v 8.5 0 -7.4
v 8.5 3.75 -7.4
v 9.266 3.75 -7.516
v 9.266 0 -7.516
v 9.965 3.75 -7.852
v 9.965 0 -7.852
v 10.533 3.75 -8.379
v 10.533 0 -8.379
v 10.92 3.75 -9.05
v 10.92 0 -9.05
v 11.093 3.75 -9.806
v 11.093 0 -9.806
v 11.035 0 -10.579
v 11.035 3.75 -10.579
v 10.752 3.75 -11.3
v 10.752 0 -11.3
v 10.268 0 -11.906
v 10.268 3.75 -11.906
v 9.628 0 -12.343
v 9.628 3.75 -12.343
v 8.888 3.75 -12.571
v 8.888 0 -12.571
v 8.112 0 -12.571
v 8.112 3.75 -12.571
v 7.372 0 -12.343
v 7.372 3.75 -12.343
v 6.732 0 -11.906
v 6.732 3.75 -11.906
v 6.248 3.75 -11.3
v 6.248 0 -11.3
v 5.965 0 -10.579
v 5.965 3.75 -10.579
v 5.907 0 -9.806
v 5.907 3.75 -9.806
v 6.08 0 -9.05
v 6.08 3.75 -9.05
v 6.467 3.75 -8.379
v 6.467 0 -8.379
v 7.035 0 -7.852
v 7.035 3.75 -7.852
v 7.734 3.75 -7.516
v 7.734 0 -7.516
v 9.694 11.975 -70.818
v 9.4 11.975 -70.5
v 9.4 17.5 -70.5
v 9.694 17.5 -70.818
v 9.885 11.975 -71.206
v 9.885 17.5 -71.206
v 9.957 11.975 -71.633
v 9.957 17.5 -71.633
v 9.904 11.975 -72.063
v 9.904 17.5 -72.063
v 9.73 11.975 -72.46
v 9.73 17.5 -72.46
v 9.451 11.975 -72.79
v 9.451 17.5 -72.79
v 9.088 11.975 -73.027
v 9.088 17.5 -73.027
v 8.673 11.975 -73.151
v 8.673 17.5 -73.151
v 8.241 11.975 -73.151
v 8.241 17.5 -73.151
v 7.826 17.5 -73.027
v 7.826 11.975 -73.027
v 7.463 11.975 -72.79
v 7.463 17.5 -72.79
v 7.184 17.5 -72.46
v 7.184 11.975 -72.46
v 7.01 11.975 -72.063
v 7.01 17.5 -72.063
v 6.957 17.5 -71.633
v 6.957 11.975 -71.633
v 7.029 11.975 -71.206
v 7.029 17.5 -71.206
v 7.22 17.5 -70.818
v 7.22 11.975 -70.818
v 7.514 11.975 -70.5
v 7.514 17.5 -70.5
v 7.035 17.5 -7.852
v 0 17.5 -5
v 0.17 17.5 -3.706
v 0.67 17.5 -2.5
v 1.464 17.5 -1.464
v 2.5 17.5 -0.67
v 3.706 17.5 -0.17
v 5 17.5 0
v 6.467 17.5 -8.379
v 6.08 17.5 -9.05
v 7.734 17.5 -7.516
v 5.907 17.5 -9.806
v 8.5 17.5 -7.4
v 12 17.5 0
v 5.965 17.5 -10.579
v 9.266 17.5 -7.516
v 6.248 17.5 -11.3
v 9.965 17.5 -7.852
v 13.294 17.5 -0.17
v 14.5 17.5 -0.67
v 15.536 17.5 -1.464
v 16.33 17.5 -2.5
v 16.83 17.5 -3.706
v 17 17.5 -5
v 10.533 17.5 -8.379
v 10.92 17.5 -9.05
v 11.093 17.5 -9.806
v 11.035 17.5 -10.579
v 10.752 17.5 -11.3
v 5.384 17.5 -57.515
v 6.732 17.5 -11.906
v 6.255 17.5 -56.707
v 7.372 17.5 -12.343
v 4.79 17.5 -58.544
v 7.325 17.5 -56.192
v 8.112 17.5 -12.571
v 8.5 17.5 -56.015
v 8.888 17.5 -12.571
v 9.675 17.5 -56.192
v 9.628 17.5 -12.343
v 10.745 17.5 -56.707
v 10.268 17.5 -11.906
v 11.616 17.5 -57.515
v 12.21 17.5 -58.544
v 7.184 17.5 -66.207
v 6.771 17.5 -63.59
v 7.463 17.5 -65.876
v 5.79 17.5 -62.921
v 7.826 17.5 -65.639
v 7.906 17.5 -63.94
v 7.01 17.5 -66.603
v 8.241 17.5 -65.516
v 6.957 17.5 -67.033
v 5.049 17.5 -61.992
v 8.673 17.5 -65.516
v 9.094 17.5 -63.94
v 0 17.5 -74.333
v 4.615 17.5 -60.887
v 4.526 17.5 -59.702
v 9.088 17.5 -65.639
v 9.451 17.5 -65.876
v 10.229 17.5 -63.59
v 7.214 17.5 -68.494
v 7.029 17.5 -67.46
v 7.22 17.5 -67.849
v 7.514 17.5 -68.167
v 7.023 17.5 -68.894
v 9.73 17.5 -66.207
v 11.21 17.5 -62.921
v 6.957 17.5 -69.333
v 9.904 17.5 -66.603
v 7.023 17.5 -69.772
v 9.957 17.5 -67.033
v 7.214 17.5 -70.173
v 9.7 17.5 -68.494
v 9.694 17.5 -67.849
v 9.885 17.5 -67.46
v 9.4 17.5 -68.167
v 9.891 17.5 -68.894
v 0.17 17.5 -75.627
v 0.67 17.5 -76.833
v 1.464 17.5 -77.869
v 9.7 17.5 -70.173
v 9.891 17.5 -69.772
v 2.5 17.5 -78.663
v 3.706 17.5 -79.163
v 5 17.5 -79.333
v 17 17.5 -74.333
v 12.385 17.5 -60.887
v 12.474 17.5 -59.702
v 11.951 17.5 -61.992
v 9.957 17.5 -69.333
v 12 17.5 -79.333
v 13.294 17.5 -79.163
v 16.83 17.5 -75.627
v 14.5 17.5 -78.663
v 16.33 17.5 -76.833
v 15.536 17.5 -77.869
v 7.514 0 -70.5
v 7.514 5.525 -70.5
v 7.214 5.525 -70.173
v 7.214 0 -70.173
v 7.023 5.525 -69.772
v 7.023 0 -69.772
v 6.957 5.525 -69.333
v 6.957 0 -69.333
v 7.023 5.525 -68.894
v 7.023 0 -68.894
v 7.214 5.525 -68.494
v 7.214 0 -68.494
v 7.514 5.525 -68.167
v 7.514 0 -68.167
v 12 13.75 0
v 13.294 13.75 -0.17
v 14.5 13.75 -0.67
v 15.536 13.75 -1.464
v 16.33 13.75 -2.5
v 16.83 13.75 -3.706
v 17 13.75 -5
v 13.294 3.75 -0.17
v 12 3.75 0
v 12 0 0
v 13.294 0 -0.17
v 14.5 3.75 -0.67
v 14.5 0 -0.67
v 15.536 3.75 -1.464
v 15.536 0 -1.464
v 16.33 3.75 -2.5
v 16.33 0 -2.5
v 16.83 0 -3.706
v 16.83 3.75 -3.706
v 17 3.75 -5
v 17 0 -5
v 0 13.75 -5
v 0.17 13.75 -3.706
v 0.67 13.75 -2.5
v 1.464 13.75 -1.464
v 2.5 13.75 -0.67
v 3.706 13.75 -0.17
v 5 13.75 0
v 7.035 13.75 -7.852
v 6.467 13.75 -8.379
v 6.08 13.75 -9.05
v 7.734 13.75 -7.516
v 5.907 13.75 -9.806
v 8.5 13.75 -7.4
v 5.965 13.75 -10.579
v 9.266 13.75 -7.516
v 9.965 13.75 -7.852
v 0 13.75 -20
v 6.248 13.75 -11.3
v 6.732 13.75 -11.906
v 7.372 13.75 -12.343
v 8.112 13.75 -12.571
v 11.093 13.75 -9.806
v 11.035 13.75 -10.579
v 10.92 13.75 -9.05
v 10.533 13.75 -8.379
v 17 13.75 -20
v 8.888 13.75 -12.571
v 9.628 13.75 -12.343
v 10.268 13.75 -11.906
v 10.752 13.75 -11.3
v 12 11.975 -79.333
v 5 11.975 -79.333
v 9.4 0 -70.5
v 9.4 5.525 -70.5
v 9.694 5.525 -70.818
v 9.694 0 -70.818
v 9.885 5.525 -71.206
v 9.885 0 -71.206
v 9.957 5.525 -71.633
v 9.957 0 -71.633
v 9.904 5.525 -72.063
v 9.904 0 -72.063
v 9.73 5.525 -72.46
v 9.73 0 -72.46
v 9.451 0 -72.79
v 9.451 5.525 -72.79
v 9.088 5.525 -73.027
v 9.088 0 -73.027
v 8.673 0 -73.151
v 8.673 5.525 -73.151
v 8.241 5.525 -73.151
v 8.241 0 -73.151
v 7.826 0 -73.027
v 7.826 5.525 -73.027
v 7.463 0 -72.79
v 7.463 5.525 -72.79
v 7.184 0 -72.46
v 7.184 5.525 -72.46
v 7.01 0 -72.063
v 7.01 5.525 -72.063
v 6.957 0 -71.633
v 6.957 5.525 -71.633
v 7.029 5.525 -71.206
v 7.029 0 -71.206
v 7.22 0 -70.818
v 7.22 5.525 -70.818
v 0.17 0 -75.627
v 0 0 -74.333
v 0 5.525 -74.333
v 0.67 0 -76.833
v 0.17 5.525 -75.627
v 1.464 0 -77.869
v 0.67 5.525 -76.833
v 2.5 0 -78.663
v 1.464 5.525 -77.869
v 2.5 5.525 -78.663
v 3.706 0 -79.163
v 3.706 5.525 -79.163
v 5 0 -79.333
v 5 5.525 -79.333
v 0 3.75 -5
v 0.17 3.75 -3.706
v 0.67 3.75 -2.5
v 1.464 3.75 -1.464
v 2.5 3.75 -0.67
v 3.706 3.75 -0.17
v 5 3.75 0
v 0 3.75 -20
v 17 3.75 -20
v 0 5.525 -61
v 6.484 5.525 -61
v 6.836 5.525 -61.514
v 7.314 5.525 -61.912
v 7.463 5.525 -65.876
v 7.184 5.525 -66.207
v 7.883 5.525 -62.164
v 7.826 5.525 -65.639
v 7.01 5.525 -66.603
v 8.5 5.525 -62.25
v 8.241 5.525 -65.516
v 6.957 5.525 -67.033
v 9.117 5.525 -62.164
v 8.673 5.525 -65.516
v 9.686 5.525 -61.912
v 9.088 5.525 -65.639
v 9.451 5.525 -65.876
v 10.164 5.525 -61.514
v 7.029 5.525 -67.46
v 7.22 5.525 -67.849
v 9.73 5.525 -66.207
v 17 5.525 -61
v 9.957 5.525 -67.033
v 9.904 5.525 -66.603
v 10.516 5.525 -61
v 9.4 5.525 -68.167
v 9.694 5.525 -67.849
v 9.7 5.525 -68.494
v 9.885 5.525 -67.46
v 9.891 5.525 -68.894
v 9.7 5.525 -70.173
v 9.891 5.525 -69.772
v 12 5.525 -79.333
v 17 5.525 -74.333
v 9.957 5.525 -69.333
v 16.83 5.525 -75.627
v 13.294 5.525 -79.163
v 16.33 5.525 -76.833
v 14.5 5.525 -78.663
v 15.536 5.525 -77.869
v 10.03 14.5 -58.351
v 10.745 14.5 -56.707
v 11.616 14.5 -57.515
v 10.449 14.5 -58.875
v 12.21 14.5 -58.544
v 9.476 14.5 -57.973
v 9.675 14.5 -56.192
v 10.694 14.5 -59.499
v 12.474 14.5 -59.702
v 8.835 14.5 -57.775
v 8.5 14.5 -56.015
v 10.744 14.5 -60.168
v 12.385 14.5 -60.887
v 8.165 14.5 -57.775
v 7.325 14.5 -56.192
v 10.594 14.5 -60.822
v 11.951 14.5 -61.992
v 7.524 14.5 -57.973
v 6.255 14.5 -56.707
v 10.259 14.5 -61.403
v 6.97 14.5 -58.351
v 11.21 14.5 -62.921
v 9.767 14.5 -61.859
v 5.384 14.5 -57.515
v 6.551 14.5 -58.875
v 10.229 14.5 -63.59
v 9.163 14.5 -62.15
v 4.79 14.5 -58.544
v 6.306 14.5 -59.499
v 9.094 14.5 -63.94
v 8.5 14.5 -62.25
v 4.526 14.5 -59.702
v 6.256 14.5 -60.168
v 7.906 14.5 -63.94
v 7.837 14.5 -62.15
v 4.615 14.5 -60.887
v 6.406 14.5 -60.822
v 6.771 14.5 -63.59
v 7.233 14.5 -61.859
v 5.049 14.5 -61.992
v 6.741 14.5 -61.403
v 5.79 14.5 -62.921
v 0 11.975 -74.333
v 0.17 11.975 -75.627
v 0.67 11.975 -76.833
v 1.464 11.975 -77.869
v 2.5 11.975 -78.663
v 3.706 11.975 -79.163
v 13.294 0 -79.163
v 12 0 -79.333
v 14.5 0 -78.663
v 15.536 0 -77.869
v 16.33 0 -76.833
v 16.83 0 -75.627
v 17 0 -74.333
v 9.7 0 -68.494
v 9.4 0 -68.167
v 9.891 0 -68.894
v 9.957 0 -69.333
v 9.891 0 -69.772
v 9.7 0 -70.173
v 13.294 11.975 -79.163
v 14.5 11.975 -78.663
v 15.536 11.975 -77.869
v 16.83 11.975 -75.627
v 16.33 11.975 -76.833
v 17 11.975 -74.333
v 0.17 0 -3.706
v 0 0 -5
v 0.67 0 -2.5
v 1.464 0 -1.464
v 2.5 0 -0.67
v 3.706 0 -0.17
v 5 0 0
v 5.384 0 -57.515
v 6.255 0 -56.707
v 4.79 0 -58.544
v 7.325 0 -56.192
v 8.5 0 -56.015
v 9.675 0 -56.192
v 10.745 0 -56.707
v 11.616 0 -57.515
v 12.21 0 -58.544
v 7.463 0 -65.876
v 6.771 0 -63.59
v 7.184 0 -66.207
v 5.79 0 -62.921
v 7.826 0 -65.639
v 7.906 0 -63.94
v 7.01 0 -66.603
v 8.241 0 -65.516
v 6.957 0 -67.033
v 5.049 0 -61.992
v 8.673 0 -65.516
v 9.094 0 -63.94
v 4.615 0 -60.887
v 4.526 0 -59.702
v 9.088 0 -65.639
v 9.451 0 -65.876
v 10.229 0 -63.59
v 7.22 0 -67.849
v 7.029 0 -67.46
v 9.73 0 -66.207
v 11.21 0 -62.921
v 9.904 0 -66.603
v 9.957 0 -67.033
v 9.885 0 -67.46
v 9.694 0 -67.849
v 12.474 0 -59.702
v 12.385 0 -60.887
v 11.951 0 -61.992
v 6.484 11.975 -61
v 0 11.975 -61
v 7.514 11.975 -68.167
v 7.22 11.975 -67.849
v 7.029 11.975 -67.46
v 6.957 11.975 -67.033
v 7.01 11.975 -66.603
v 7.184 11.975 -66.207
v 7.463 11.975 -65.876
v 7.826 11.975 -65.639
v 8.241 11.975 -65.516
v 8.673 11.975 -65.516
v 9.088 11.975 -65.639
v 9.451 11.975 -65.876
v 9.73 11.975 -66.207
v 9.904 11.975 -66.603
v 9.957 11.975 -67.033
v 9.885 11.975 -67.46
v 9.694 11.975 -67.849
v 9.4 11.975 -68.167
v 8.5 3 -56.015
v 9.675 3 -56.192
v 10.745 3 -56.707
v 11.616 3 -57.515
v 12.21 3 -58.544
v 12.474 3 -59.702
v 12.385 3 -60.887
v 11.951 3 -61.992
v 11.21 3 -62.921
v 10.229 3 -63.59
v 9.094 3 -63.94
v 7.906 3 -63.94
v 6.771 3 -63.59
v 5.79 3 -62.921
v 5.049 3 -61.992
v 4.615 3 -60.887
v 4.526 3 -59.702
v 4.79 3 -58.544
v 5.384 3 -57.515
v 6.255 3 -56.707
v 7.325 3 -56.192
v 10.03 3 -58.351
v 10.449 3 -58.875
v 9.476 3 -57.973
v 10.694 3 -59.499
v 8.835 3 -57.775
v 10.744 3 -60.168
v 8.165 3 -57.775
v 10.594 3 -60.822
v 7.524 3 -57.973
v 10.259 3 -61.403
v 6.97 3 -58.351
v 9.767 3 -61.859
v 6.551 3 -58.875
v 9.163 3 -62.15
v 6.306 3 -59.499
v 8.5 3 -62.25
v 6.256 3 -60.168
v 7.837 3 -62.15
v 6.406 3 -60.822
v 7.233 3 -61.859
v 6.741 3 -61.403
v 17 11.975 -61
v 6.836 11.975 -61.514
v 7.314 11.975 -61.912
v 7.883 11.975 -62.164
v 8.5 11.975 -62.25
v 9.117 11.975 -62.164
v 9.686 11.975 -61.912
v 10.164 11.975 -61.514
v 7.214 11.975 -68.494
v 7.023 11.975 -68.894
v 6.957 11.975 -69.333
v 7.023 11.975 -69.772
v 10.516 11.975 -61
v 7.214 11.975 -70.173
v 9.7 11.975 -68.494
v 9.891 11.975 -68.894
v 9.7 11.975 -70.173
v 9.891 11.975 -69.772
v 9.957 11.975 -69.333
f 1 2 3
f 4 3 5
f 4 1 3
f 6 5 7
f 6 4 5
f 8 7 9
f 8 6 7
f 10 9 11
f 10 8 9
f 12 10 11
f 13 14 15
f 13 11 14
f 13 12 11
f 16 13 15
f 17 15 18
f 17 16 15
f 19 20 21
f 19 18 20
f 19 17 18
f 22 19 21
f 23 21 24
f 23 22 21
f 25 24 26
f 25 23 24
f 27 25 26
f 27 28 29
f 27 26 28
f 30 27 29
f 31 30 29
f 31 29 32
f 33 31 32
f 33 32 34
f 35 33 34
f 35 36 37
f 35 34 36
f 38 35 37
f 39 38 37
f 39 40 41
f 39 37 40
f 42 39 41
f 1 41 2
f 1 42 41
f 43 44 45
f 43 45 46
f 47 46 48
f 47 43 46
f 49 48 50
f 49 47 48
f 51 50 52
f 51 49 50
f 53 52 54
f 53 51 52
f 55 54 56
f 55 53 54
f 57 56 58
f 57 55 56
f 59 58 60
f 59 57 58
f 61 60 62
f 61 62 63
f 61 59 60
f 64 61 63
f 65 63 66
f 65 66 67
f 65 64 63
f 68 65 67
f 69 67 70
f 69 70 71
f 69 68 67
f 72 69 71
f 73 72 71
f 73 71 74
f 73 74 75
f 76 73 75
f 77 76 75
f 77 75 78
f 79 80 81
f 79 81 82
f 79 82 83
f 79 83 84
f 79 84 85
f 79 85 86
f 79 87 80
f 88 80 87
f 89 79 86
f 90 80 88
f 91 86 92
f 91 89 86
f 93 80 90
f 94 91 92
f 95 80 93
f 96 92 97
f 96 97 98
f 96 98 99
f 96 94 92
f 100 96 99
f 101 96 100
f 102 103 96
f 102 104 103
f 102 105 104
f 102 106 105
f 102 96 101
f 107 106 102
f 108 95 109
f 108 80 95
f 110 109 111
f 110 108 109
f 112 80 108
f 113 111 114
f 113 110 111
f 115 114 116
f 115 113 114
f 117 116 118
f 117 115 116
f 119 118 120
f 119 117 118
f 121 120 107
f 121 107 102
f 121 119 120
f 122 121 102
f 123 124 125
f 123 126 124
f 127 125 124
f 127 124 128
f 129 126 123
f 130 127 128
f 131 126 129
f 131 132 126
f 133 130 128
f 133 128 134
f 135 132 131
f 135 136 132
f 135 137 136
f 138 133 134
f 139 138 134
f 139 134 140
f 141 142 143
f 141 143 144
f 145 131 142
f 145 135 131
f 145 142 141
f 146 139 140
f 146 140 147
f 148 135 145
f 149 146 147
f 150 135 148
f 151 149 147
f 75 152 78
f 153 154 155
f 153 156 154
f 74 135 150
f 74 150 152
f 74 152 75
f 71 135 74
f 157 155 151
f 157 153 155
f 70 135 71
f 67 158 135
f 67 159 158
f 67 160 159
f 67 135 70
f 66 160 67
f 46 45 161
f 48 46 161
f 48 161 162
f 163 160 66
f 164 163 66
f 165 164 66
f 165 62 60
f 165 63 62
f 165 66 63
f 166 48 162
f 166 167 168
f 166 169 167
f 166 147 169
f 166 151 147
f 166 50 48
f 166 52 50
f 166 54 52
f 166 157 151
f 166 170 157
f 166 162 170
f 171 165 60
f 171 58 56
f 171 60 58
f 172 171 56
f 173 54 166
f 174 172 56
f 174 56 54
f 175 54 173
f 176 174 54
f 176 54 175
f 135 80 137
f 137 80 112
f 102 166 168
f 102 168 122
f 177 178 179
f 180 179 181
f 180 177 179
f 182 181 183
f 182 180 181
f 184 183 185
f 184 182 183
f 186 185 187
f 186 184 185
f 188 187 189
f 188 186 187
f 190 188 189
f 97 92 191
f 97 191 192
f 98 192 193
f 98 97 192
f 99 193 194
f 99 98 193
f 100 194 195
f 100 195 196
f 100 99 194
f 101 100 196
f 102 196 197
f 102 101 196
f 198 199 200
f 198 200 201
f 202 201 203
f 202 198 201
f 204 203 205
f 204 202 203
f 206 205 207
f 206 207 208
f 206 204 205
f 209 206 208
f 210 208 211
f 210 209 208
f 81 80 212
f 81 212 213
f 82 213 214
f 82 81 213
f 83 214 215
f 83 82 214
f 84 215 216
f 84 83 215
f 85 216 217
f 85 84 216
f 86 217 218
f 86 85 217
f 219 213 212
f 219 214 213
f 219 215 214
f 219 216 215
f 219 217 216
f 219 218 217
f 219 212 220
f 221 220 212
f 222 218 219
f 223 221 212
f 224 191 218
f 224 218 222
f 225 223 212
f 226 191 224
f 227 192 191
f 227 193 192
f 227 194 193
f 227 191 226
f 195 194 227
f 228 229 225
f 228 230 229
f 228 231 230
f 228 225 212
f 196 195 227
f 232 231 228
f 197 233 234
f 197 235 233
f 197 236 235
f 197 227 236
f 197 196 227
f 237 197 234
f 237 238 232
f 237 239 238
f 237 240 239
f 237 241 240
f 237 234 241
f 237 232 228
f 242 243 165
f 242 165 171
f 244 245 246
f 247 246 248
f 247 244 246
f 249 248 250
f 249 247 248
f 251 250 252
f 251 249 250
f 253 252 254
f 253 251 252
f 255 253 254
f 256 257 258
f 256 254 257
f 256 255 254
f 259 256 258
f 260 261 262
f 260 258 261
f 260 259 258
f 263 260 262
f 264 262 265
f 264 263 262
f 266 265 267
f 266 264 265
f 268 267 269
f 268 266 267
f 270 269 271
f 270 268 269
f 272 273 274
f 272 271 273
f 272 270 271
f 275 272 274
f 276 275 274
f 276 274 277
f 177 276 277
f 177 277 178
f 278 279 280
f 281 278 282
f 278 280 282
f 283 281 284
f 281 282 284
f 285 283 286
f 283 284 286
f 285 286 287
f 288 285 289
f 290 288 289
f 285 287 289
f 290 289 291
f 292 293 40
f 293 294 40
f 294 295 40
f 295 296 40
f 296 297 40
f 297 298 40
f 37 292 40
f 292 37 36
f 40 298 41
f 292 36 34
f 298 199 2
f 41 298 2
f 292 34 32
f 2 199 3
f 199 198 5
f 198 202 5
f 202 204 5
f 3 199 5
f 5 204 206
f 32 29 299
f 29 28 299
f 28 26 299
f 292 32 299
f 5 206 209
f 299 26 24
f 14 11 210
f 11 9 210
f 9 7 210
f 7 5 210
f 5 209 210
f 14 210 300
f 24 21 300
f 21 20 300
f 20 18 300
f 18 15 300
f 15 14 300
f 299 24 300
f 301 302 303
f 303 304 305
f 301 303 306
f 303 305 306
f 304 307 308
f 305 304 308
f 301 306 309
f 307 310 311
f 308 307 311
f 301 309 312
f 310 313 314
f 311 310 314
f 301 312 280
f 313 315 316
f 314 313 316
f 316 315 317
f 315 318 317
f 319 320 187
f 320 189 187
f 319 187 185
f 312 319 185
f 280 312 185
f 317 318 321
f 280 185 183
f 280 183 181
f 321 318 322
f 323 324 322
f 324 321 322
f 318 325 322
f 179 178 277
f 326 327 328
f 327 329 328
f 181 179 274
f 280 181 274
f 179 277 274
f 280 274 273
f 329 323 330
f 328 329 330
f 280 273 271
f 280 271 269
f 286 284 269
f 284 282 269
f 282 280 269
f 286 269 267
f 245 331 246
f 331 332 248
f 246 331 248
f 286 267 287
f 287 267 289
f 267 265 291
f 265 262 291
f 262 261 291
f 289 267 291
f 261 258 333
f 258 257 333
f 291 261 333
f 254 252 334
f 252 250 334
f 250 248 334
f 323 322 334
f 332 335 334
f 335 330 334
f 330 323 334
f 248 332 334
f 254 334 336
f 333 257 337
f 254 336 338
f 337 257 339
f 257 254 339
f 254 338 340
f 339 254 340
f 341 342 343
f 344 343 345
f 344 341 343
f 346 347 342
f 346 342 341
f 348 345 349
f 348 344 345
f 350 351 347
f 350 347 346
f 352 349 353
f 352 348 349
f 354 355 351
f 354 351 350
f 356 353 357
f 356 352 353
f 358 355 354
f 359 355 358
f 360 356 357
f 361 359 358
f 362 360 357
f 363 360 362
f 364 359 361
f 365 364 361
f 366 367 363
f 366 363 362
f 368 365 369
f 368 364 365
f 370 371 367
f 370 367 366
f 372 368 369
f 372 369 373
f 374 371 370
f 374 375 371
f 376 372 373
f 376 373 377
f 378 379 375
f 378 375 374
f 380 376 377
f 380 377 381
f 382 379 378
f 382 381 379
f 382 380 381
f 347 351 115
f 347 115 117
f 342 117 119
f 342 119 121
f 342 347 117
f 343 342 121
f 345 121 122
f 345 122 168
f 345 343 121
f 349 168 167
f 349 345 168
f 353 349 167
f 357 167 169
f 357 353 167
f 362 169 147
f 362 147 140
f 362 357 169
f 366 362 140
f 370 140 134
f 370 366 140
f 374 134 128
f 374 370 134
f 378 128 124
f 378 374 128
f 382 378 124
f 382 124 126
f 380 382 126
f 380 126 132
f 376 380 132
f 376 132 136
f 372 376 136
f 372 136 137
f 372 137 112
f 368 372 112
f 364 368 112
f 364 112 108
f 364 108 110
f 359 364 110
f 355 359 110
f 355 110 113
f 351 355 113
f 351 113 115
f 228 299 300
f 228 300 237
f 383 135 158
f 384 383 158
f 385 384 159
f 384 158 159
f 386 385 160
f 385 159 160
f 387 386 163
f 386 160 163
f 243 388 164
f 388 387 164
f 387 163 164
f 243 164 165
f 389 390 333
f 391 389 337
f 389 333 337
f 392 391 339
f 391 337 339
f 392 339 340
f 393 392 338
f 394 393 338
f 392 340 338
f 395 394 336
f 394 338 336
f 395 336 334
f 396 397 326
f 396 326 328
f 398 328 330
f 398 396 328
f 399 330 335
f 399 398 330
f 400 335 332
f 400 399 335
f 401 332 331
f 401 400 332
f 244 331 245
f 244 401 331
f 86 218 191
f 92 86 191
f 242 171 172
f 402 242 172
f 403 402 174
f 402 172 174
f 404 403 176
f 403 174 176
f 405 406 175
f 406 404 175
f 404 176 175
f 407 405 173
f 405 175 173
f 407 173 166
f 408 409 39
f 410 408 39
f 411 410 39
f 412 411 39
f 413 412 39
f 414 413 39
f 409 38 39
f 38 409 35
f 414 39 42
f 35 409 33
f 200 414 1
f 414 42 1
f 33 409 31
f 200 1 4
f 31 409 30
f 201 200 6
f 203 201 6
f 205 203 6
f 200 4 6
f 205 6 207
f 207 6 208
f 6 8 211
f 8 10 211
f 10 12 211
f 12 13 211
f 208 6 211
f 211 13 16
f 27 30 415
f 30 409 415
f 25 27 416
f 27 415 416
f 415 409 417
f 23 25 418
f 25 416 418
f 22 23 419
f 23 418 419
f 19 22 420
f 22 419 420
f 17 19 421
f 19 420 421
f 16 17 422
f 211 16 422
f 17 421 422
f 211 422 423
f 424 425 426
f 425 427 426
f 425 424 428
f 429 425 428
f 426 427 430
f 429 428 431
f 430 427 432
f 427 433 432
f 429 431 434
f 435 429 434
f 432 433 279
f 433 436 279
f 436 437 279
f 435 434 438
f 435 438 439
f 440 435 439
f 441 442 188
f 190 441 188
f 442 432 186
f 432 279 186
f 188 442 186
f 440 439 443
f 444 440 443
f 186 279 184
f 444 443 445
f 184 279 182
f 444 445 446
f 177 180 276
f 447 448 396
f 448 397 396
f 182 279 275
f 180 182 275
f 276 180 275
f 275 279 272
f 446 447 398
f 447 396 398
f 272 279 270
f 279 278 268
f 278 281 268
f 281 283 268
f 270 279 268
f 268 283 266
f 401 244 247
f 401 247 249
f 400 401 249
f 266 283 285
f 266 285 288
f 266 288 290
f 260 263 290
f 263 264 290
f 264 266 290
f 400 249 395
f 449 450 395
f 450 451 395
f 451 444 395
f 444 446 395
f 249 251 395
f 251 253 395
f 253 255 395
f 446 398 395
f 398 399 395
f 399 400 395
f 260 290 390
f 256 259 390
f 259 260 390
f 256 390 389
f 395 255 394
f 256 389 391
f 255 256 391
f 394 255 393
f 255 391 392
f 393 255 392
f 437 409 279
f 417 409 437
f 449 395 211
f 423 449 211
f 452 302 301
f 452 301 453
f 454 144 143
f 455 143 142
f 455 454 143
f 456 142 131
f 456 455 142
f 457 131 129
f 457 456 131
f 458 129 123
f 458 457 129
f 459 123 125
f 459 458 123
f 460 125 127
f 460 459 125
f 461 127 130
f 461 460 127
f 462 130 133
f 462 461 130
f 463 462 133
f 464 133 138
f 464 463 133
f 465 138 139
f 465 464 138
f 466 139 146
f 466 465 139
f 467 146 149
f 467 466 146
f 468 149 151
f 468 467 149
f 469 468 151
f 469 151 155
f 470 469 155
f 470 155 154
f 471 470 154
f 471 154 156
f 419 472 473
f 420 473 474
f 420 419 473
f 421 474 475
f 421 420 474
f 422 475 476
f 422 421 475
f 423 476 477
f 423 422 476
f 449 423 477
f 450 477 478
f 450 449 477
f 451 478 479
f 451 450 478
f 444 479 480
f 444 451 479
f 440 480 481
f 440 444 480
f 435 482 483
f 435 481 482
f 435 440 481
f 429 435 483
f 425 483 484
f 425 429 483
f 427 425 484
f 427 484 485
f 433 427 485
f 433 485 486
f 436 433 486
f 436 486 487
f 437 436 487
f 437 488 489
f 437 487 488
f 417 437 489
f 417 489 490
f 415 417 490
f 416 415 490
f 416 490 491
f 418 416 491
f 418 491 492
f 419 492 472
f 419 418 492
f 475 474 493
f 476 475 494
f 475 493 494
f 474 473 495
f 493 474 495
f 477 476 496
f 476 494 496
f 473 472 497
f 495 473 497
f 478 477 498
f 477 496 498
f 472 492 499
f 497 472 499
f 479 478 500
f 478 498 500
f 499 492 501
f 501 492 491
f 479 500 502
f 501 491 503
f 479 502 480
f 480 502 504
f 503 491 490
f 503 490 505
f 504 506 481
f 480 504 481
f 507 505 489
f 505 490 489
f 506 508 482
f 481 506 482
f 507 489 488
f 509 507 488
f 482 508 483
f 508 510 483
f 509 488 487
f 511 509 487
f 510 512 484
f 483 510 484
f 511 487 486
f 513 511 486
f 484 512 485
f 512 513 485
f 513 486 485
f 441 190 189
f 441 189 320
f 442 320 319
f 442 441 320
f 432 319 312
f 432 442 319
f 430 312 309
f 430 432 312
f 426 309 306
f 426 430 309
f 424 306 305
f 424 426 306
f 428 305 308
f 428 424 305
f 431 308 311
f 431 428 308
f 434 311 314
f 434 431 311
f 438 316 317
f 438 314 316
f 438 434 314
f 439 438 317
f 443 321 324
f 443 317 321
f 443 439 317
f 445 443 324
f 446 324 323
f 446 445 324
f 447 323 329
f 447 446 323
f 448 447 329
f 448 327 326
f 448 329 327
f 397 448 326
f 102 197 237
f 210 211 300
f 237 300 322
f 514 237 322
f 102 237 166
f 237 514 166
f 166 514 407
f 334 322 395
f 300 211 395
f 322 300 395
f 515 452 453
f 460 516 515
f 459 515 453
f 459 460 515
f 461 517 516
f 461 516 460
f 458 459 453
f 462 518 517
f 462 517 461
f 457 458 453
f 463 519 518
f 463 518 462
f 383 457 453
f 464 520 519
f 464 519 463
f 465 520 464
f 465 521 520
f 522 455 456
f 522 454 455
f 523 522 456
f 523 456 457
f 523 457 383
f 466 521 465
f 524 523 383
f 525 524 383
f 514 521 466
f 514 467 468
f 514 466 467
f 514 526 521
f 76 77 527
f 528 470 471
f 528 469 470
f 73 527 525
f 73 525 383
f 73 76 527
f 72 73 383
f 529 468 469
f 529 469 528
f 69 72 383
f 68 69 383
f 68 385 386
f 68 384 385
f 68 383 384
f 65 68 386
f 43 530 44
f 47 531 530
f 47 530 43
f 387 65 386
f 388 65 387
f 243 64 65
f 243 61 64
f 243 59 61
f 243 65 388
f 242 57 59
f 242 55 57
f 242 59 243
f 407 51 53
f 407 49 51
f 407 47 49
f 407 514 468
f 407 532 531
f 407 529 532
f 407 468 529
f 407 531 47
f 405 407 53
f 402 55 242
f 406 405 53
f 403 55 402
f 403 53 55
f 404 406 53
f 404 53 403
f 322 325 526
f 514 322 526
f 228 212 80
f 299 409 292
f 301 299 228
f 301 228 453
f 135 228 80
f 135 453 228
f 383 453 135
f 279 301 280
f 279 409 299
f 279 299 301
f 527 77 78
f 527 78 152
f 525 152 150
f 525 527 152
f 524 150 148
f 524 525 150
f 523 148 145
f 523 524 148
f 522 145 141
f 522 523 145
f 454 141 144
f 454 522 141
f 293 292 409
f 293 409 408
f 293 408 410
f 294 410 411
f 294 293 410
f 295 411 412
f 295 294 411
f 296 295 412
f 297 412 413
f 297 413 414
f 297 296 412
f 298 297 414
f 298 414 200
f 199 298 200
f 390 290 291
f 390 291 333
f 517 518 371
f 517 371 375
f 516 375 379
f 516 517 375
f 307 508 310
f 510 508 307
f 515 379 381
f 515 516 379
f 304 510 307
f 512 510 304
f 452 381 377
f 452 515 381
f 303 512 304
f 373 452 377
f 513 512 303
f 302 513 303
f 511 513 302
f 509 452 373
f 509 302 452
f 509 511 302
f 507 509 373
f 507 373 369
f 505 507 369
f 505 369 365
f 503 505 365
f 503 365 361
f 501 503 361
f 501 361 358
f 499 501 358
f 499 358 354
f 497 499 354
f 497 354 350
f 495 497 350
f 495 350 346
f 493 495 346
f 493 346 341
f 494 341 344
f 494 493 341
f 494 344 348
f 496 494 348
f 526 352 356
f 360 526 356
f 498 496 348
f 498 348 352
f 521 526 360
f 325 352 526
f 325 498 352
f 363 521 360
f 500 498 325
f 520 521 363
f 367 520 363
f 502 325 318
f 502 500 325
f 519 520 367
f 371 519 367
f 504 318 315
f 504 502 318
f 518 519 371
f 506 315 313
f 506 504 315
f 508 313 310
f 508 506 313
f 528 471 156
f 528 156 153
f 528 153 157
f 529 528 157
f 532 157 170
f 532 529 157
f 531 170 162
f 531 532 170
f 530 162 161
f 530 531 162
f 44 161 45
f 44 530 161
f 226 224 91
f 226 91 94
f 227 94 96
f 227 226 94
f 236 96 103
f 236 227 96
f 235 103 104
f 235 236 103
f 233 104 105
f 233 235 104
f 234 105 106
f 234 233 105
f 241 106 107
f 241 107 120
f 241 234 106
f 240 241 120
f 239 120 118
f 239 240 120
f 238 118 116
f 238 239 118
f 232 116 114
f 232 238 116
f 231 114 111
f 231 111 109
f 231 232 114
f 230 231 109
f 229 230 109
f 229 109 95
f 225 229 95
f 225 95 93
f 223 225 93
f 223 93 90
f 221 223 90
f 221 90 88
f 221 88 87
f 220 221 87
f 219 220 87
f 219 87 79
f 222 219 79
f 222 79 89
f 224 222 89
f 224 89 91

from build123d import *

# Parameters (mm, degrees)
SKETCH1_W                = 17
SKETCH1_H                = 79.3333
SKETCH1_R                = 2.6
SKETCH1_R_2              = 3.985
BOSS_EXTRUDE1_DEPTH      = 17.5
FILLET1_R                = 5
BOSS_EXTRUDE2_DEPTH      = 5.75
BOSS_EXTRUDE2_DEPTH_BACK = 5.75
SKETCH3_R                = 3.985
SKETCH3_R_2              = 2.25
SKETCH2_W                = 40
SKETCH2_H                = 10
SKETCH2_W_2              = 36.666864
SKETCH2_H_2              = 6.45
CUT_EXTRUDE2_DEPTH       = 84.000135475


with BuildPart() as part:
    # Sketch1 → Boss-Extrude1 (new body)
    with BuildSketch(Plane(origin=(0, 0, 0), x_dir=(1, 0, 0), z_dir=(0, 1, 0))):
        with Locations((8.5, 39.66665)):
            Rectangle(SKETCH1_W, SKETCH1_H)
        with Locations(Location((8.5, 10, 0), (0, 0, 270))):
            Circle(SKETCH1_R, mode=Mode.SUBTRACT)
        with Locations(Location((8.5, 60, 0), (0, 0, 270))):
            Circle(SKETCH1_R_2, mode=Mode.SUBTRACT)
        with BuildLine():
            ThreePointArc((7.51420262, 70.4998675), (6.957011868, 69.333201), (7.51420262, 68.1665345))
            ThreePointArc((7.51420262, 68.1665345), (8.457011868, 65.499868), (9.399821116, 68.1665345))
            ThreePointArc((9.399821116, 68.1665345), (9.957011868, 69.333201), (9.399821116, 70.4998675))
            ThreePointArc((9.399821116, 70.4998675), (8.457011868, 73.166534), (7.51420262, 70.4998675))
        make_face(mode=Mode.SUBTRACT)
    extrude(amount=BOSS_EXTRUDE1_DEPTH)

    # Fillet1
    fillet1_edges = [part.edges().sort_by_distance(p)[0] for p in [
        (0, 8.75, -79.3333),
        (17, 8.75, -79.3333),
        (17, 8.75, 0),
        (0, 8.75, 0),
    ]]
    fillet(fillet1_edges, radius=FILLET1_R)

    # Sketch3 → Boss-Extrude2 (add, two sides: drawn at the far end of the back side and taken through both)
    with BuildSketch(Plane(origin=(0, 8.75, 0), x_dir=(1, 0, 0), z_dir=(0, 1, 0)).offset(-BOSS_EXTRUDE2_DEPTH_BACK)):
        with Locations(Location((8.5, 60, 0), (0, 0, 90))):
            Circle(SKETCH3_R)
        with Locations(Location((8.5, 60, 0), (0, 0, 90))):
            Circle(SKETCH3_R_2, mode=Mode.SUBTRACT)
    extrude(amount=BOSS_EXTRUDE2_DEPTH + BOSS_EXTRUDE2_DEPTH_BACK)

    # Sketch2 → Cut-Extrude2 (cut, through all)
    with BuildSketch(Plane(origin=(17, 0, 0), x_dir=(0, 0, -1), z_dir=(1, 0, 0))):
        with Locations((0, 8.75)):
            Rectangle(SKETCH2_W, SKETCH2_H)
        with Locations((79.3333, 8.75)):
            Rectangle(SKETCH2_W_2, SKETCH2_H_2)
    extrude(amount=-CUT_EXTRUDE2_DEPTH, mode=Mode.SUBTRACT)


solid = part.part
